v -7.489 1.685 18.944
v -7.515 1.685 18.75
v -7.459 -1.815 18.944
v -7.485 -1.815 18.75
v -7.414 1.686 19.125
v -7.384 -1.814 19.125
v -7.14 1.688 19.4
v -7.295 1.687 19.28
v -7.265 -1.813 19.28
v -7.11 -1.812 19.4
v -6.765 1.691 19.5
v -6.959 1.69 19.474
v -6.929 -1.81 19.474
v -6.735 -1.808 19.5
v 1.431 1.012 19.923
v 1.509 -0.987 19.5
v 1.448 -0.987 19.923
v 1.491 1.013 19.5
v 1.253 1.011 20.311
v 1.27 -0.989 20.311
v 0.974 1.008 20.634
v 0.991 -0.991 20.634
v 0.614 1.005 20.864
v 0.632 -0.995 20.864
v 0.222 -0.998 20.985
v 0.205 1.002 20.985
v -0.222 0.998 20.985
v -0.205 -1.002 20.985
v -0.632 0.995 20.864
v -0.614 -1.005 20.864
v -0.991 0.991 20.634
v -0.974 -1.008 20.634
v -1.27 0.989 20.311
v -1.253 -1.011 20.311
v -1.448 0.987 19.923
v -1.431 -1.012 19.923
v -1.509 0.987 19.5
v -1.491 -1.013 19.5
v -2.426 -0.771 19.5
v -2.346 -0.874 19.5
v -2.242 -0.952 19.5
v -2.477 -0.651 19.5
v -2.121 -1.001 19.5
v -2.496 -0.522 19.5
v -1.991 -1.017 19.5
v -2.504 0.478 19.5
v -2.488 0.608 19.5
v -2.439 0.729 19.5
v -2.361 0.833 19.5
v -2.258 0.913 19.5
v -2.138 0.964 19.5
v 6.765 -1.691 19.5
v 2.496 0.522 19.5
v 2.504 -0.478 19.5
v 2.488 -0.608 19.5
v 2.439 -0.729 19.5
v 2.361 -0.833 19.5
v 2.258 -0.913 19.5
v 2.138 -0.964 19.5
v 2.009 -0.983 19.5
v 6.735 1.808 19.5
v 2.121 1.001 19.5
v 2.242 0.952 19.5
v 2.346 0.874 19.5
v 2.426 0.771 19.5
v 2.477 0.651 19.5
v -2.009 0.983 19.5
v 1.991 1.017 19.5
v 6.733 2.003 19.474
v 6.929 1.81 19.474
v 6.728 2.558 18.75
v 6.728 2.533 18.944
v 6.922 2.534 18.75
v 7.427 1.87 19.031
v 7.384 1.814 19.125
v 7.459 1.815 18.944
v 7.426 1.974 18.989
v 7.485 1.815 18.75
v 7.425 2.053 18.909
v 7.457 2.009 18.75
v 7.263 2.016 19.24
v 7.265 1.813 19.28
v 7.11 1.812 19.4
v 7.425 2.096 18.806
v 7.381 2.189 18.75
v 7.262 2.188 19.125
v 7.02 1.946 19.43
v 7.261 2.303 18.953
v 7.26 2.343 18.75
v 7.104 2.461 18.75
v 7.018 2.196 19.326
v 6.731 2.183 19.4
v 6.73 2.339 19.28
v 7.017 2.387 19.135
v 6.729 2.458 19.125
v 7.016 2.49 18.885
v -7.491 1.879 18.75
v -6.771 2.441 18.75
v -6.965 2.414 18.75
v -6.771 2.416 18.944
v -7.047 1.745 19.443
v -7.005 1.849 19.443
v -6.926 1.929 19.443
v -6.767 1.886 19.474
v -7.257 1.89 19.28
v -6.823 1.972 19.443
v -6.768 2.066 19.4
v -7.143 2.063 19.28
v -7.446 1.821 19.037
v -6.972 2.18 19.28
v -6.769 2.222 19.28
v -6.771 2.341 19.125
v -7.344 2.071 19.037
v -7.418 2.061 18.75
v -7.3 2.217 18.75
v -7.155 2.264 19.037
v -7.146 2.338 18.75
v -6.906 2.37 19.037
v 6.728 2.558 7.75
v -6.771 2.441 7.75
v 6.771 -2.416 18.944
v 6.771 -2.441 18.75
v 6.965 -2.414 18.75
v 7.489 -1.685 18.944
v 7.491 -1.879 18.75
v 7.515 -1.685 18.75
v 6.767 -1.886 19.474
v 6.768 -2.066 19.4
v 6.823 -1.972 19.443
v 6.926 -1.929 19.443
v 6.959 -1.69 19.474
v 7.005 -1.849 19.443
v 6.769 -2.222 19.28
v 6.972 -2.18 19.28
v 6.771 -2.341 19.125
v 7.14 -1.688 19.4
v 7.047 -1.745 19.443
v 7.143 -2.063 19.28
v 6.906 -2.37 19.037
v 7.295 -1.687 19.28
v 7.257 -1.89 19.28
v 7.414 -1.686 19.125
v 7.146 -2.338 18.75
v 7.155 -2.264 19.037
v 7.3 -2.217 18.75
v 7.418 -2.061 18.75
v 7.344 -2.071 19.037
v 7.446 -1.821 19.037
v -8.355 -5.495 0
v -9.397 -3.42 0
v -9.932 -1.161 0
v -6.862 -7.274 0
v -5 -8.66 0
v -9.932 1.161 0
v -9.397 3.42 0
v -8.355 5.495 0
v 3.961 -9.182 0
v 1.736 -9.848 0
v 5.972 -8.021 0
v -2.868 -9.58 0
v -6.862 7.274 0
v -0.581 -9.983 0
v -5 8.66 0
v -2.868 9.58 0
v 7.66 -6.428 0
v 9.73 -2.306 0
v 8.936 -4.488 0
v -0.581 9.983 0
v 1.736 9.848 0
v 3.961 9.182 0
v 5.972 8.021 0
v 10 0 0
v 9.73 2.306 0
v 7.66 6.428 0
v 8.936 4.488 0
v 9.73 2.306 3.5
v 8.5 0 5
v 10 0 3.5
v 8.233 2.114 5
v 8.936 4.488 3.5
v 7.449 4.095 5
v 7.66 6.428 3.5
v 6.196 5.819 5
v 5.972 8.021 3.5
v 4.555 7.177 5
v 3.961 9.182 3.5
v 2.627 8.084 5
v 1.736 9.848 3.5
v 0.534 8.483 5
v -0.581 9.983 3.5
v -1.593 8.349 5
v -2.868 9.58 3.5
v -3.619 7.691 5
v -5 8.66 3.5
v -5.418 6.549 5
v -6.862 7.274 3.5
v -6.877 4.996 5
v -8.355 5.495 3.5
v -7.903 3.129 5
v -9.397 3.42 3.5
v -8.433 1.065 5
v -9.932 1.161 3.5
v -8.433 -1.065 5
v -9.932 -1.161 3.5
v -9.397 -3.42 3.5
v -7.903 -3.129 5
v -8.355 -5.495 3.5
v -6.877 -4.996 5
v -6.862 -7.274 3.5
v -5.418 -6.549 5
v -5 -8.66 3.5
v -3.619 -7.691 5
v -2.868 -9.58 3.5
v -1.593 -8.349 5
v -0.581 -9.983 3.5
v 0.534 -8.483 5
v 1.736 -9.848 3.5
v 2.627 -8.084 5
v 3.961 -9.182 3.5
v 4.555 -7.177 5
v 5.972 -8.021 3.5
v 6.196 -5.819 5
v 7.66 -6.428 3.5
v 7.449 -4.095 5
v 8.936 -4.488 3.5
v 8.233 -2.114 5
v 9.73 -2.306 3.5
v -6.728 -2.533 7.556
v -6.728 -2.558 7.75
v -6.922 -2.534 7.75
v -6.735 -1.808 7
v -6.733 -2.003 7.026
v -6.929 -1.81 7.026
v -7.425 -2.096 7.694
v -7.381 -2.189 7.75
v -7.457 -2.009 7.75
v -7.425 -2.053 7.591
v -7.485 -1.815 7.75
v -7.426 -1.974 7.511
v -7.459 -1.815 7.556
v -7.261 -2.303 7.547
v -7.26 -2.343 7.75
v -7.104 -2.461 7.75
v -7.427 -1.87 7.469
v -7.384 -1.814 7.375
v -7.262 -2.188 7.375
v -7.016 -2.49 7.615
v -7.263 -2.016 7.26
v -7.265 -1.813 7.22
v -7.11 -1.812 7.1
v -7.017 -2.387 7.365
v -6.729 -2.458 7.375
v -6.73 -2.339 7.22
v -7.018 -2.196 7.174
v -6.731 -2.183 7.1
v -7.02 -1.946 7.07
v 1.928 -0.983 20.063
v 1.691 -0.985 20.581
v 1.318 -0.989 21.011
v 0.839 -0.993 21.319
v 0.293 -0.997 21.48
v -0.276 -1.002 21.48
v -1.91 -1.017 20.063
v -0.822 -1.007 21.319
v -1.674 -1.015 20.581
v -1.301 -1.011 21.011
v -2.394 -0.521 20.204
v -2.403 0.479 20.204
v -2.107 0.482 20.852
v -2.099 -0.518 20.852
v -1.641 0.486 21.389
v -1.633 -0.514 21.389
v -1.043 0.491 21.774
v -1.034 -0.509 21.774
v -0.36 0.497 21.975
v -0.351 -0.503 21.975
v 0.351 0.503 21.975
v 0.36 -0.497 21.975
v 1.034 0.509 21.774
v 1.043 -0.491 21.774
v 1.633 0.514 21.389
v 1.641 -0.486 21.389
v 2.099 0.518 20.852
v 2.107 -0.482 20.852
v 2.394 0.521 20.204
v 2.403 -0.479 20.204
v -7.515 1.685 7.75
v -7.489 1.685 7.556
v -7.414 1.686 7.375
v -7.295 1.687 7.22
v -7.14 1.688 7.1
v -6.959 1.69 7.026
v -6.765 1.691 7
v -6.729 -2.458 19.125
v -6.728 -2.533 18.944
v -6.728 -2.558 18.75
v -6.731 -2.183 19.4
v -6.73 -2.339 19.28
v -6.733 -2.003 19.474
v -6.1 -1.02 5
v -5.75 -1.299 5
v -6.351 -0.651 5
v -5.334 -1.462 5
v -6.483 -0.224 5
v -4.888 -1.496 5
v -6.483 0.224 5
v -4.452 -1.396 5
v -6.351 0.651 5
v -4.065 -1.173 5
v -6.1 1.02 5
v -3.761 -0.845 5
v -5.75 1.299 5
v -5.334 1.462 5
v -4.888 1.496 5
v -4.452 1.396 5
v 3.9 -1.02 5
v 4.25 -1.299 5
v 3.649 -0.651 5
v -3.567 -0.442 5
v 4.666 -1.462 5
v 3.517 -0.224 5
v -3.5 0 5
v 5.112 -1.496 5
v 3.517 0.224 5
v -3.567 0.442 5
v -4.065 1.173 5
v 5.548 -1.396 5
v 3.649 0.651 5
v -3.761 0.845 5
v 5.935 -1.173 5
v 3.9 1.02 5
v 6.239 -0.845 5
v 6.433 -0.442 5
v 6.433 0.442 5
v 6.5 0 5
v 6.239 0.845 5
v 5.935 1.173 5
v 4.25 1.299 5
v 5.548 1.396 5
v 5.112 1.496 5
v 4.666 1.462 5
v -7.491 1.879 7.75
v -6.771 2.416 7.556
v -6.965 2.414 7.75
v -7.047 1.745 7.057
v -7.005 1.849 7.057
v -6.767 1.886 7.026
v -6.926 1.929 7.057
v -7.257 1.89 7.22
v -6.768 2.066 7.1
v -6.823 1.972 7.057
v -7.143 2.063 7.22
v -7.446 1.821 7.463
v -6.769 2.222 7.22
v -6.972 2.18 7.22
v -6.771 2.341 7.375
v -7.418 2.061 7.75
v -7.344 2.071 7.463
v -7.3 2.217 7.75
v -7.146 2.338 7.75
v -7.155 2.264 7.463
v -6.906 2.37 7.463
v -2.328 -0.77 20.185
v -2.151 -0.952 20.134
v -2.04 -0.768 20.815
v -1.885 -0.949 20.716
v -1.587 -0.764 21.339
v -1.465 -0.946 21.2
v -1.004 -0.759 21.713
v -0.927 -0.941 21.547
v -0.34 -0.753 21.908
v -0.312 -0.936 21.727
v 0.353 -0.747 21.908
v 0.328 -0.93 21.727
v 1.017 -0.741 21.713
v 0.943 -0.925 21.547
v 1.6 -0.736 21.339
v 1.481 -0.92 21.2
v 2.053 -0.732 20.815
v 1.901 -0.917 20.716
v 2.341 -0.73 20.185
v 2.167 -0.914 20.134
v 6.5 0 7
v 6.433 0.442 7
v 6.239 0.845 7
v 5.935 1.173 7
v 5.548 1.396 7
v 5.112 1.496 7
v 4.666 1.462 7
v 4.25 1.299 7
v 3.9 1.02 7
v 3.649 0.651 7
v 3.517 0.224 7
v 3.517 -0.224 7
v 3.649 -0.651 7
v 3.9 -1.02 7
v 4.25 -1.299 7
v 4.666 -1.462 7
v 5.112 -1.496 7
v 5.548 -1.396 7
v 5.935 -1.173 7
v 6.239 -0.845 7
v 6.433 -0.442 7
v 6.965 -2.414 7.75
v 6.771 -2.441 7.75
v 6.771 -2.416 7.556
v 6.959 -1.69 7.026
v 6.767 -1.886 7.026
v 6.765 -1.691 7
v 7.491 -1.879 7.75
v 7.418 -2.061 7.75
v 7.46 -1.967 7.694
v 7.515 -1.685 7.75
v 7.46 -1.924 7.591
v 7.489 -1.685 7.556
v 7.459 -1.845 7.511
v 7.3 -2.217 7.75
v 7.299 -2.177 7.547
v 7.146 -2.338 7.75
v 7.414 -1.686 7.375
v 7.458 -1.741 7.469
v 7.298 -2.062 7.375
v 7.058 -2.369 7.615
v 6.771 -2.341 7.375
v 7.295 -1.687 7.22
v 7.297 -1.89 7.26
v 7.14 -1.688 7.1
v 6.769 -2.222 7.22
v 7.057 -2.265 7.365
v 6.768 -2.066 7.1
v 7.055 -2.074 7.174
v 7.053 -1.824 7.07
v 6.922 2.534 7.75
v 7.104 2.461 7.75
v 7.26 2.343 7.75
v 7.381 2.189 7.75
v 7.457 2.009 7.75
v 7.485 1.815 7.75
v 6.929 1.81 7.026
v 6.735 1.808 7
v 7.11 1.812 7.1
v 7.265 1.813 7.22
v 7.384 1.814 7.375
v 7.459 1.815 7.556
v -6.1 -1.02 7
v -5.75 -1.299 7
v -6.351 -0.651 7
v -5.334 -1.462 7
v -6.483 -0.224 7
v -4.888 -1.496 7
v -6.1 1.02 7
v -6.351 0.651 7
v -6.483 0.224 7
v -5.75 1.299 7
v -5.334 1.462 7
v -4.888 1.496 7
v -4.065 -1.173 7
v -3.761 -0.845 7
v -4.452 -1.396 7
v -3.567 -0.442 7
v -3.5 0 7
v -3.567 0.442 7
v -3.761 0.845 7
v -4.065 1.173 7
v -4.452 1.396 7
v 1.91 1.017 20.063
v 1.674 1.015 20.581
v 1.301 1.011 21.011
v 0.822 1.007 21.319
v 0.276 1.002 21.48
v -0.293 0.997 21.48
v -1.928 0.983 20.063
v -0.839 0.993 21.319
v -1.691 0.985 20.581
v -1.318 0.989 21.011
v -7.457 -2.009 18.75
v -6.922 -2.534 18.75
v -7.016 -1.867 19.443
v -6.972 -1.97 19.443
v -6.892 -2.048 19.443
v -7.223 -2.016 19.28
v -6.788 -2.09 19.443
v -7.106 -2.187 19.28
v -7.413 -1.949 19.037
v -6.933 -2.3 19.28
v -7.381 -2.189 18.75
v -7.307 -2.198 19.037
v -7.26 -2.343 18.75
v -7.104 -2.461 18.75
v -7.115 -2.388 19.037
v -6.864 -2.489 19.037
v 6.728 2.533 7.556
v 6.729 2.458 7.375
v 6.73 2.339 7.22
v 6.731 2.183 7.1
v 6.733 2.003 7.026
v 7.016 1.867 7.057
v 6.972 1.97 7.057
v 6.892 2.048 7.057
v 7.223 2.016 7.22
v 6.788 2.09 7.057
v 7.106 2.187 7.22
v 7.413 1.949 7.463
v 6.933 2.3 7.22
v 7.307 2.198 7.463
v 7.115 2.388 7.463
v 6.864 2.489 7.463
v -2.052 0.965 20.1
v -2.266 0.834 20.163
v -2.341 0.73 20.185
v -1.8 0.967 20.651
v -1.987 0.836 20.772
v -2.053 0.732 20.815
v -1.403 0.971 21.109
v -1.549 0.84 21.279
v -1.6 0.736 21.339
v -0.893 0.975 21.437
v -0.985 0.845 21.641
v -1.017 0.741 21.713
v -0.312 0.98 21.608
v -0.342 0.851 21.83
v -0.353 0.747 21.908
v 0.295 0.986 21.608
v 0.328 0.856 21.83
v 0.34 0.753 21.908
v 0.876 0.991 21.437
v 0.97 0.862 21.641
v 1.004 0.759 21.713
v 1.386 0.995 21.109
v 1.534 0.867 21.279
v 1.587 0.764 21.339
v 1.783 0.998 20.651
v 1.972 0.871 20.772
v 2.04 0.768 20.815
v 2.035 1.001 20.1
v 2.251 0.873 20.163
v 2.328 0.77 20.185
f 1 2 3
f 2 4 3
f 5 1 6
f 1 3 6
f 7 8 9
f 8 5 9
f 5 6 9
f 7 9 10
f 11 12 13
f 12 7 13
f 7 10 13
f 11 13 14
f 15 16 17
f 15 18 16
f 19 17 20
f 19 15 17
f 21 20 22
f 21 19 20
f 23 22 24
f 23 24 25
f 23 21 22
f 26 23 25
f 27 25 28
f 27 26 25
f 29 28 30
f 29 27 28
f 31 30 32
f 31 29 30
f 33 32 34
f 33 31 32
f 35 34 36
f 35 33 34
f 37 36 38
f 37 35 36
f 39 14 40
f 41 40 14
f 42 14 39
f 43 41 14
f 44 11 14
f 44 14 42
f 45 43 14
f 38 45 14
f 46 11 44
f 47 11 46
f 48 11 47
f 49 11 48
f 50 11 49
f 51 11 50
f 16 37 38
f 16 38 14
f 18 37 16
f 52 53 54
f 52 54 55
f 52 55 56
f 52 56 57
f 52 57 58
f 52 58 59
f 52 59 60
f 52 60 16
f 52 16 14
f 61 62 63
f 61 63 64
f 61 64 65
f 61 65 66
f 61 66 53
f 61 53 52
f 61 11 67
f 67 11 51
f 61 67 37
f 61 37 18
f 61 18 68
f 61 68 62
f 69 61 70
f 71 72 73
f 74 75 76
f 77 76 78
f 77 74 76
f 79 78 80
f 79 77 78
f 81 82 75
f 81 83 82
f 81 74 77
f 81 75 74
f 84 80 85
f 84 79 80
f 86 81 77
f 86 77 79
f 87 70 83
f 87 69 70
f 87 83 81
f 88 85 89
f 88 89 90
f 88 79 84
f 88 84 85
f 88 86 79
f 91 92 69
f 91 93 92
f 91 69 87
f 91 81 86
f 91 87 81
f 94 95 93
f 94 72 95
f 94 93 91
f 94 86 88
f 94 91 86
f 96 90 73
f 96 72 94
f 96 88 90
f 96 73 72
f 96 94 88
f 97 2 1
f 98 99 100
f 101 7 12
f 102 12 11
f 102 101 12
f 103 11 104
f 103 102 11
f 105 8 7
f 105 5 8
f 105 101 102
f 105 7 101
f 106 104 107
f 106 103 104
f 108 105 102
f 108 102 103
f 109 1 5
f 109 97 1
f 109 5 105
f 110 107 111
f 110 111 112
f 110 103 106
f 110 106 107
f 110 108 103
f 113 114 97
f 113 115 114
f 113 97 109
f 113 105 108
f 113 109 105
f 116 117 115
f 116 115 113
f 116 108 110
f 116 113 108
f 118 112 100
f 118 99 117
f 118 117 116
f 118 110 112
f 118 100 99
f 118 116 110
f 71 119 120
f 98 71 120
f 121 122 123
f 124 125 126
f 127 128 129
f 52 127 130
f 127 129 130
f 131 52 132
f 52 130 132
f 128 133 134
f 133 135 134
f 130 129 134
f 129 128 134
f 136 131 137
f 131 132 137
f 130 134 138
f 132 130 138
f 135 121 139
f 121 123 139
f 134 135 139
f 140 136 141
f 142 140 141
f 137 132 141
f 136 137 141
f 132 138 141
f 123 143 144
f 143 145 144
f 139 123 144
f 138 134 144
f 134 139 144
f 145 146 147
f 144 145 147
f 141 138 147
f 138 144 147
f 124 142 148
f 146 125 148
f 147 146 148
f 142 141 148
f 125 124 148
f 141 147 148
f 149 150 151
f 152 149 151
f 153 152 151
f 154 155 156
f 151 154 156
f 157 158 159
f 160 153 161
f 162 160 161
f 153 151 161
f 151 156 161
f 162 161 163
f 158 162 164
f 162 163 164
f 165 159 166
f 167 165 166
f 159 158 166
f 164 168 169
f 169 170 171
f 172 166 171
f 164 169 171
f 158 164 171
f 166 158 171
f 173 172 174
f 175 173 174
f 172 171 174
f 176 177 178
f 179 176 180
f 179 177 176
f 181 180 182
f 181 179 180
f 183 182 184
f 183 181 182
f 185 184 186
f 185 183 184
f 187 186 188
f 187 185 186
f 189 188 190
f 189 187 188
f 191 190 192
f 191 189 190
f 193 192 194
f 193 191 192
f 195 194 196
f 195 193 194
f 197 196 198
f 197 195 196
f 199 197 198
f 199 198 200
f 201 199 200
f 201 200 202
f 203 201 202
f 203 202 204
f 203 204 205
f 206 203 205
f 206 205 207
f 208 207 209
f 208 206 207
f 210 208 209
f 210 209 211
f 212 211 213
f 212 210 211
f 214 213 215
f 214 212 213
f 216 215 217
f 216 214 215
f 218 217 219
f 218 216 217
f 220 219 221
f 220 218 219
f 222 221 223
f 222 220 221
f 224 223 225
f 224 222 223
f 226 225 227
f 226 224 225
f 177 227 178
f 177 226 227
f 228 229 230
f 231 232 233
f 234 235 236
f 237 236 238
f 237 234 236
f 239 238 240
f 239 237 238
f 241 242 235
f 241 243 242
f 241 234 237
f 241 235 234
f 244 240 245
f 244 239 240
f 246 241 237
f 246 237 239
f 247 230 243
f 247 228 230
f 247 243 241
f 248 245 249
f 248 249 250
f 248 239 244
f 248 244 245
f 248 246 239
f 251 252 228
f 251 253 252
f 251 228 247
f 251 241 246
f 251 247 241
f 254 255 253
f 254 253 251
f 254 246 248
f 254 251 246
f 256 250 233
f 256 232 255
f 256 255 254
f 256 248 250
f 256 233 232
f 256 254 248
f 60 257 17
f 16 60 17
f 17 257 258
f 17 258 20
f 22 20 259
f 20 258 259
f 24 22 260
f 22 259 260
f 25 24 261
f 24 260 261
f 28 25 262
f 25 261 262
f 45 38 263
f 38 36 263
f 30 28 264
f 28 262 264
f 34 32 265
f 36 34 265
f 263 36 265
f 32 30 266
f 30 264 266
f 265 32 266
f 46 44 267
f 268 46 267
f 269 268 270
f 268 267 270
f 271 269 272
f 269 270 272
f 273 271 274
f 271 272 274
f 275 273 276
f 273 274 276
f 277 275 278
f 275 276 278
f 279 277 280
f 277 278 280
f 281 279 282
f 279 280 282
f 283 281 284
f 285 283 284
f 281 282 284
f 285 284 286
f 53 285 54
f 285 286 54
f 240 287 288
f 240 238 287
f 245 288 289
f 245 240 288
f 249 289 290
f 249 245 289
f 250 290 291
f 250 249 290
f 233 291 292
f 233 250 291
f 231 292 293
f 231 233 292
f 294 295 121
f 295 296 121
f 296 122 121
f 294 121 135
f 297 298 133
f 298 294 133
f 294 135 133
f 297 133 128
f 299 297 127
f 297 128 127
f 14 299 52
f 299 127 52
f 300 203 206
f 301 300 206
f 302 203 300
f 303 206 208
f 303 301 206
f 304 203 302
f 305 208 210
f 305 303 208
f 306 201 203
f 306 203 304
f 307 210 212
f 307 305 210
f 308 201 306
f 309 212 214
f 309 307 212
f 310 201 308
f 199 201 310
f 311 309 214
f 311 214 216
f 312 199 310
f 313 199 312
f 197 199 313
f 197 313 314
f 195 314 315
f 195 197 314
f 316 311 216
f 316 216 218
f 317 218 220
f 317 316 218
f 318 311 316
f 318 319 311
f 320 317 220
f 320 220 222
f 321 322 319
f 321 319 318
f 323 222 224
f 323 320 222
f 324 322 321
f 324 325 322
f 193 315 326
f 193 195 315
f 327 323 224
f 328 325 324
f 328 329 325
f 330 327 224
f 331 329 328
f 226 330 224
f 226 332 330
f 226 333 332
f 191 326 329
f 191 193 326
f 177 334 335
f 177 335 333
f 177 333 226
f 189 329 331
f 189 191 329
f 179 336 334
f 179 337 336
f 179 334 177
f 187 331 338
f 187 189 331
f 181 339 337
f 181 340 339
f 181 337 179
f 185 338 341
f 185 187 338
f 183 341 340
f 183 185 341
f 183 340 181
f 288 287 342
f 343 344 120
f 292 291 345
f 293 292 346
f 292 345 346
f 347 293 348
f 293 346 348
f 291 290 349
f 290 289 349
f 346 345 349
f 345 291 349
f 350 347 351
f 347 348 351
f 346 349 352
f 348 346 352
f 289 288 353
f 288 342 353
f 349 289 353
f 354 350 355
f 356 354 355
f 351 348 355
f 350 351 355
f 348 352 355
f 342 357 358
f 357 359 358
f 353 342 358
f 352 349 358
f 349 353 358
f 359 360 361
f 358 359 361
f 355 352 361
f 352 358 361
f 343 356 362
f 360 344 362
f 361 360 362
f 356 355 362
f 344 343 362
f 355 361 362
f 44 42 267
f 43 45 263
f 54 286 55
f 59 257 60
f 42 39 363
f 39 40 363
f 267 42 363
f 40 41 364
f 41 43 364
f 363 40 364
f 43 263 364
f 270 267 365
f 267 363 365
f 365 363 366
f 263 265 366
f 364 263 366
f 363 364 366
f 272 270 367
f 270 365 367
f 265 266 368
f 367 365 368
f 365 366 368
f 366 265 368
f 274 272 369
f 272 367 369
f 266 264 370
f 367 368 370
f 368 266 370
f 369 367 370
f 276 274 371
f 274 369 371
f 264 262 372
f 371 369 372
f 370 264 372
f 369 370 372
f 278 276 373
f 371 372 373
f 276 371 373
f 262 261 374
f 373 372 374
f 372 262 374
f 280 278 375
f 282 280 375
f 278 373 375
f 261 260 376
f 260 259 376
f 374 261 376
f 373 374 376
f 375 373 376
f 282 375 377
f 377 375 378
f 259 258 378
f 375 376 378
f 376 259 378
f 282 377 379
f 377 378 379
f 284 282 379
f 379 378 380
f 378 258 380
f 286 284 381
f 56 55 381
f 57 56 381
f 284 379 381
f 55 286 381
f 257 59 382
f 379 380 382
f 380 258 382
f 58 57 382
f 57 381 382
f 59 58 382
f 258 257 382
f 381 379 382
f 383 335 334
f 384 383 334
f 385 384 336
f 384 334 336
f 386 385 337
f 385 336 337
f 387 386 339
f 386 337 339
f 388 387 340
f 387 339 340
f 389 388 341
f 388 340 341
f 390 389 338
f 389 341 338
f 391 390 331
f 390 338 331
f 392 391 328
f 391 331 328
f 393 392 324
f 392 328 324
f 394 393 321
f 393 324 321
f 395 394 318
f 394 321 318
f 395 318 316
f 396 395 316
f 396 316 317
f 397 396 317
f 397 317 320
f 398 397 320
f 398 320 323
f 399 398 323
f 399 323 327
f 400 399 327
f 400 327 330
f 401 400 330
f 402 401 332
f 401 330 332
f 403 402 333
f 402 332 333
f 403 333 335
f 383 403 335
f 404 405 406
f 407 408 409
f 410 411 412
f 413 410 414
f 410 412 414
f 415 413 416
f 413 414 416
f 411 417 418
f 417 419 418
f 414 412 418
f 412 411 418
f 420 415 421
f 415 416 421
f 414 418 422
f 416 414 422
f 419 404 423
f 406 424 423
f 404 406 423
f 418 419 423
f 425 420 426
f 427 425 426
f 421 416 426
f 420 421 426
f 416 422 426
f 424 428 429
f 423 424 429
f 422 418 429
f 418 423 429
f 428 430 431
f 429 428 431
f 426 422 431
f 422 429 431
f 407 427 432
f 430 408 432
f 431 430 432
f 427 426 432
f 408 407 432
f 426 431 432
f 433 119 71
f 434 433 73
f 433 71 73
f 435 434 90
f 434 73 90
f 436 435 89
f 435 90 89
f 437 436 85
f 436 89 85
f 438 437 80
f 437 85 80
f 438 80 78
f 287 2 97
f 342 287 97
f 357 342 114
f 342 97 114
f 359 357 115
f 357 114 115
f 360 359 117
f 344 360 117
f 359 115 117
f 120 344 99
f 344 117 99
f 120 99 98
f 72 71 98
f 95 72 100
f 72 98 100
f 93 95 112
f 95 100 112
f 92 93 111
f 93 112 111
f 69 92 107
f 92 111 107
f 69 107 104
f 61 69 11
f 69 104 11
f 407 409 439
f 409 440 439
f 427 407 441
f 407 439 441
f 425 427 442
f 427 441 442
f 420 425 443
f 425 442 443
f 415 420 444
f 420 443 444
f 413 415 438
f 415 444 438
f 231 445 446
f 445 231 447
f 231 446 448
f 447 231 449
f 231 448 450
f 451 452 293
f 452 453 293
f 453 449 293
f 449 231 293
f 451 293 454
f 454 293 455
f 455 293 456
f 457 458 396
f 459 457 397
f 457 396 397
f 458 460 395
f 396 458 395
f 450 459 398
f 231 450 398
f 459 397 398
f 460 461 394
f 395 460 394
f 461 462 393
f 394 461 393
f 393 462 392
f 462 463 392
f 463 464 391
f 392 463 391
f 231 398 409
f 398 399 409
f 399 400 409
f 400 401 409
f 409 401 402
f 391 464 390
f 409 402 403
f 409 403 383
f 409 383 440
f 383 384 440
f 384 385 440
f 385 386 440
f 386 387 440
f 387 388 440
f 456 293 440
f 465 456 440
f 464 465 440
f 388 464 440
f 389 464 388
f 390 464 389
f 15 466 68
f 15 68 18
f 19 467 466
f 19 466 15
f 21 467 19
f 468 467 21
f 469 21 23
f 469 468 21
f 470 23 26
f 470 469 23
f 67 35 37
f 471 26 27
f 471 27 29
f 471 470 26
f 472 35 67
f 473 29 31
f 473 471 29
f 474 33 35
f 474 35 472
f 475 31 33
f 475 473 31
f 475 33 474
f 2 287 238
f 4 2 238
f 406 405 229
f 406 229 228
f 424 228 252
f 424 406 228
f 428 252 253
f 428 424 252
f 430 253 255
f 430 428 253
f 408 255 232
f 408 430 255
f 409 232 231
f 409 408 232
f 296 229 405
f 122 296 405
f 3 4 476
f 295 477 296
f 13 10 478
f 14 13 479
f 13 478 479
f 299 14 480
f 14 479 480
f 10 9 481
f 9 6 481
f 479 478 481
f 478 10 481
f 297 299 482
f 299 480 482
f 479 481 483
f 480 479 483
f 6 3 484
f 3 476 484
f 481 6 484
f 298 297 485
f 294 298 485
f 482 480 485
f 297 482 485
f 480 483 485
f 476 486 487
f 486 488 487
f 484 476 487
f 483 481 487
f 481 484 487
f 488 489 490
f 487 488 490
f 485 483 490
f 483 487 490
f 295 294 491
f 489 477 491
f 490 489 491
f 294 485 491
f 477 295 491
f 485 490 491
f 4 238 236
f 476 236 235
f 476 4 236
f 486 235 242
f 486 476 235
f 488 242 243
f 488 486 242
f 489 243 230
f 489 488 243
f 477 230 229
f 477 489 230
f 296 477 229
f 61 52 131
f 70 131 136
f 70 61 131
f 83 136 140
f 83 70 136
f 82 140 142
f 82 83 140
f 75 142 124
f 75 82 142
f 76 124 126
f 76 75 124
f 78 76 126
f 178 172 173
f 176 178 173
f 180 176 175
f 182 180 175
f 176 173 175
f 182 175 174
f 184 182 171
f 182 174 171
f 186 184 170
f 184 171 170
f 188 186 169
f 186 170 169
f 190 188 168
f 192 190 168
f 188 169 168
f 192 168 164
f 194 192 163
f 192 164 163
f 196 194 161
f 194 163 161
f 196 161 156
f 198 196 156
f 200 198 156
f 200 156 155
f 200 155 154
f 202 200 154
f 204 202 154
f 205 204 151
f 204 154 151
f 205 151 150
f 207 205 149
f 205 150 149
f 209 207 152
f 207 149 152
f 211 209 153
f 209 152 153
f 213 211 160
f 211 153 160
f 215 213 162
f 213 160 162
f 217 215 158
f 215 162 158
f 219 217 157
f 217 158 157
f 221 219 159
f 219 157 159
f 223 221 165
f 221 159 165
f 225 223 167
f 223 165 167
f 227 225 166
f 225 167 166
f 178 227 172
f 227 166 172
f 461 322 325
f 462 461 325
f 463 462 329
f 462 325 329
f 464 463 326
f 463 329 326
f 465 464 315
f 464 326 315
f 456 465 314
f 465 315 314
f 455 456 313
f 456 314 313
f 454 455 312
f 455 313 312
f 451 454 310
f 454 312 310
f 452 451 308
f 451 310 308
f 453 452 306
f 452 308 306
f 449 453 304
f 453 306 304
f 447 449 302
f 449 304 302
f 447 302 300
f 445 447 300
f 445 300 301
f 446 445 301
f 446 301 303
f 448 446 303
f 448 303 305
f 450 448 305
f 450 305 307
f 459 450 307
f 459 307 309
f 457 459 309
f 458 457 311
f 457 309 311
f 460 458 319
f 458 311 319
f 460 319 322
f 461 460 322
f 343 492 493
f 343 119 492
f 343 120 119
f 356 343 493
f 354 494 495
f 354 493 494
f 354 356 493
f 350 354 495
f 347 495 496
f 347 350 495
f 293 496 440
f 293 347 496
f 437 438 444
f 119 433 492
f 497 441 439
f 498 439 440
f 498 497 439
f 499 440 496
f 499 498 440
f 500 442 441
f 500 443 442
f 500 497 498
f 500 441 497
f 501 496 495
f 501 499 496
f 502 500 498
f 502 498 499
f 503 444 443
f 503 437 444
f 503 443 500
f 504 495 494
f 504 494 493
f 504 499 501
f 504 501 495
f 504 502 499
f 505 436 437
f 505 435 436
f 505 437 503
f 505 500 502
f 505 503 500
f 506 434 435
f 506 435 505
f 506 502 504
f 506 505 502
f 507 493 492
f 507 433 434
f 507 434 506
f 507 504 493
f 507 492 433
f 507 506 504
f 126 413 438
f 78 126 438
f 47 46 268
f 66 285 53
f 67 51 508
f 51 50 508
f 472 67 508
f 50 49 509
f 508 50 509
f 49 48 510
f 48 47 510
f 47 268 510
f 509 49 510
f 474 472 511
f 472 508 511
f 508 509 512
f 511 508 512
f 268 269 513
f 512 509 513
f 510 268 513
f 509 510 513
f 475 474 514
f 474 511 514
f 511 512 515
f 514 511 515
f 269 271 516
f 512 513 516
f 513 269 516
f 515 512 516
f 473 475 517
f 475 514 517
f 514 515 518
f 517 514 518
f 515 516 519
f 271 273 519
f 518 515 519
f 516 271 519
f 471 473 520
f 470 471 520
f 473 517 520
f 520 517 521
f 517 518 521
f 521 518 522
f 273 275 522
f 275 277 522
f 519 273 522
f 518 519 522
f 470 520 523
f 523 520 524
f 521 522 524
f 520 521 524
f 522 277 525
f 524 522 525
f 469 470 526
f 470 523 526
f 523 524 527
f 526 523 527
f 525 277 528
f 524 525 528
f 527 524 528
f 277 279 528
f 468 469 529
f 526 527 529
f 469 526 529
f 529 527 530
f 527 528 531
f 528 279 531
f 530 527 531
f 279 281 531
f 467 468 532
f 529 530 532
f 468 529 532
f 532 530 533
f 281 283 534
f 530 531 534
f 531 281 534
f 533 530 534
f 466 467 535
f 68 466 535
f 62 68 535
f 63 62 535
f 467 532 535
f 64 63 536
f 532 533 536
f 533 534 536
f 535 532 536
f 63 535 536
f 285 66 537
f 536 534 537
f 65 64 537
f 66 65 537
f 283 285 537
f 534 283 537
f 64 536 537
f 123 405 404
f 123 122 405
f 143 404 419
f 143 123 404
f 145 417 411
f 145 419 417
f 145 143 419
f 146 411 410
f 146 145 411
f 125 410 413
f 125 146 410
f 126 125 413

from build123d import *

# Parameters (mm, degrees)
F0_R      = 10
F1_DEPTH  = 5
F2_SIZE   = 1.5
F3_R      = 1.5
F4_DEPTH  = 2
F6_DEPTH  = 12.5
F7_R      = 0.75
F10_DEPTH = 1
F11_DEPTH = 1
F12_R     = 0.5


with BuildPart() as f1:
    # F0 (on Top) → F1 (new body)
    with BuildSketch(Plane.XY):
        Circle(F0_R)
    extrude(amount=F1_DEPTH)

    # F2
    f2_edges = [f1.edges().sort_by_distance(p)[0] for p in [
        (-10, 0, 5),
    ]]
    chamfer(f2_edges, length=F2_SIZE)

    # F3 (on face) → F4 (join)
    with BuildSketch(Plane.XY.offset(5)):
        with Locations((-5, 0)):
            Circle(F3_R)
        with Locations((5, 0)):
            Circle(F3_R)
    extrude(amount=F4_DEPTH)

    # F5 (on face) → F6 (join)
    with BuildSketch(Plane.XY.offset(7)):
        Polygon((-7.5213718601, 2.4349466817), (-7.4997186786, -0.0649595445), (-7.4780654971, -2.5648657707), (7.5213718601, -2.4349466817), (7.4780654971, 2.5648657707), align=None)
        with BuildLine():
            ThreePointArc((-3.5, 0), (-3.5000766094, -0.015159897), (-3.50030643, -0.0303182454))
            ThreePointArc((-3.50030643, -0.0303182454), (-4.9870080911, -1.4999437357), (-6.4989433936, -0.0562912318))
            ThreePointArc((-6.4989433936, -0.0562912318), (-5.0281505737, 1.4997358251), (-3.5, 0))
        make_face(mode=Mode.SUBTRACT)
        with BuildLine():
            Line((-6.4989433936, -0.0562912318), (-3.50030643, -0.0303182454))
            ThreePointArc((-3.50030643, -0.0303182454), (-3.5000766094, -0.015159897), (-3.5, 0))
            ThreePointArc((-3.5, 0), (-5.0281505737, 1.4997358251), (-6.4989433936, -0.0562912318))
        make_face()
        with BuildLine():
            ThreePointArc((-6.4989433936, -0.0562912318), (-4.9870080911, -1.4999437357), (-3.50030643, -0.0303182454))
            Line((-3.50030643, -0.0303182454), (-6.4989433936, -0.0562912318))
        make_face()
    extrude(amount=F6_DEPTH)

    # F7
    f7_edges = [f1.edges().sort_by_distance(p)[0] for p in [
        (0.021653, -2.499906, 7),
        (7.521372, -2.434947, 13.25),
        (-7.478065, -2.564866, 13.25),
        (-7.521372, 2.434947, 13.25),
        (-7.499719, -0.06496, 7),
        (-7.499719, -0.06496, 19.5),
        (-0.021653, 2.499906, 19.5),
        (0.021653, -2.499906, 19.5),
        (7.499719, 0.06496, 19.5),
        (7.478065, 2.564866, 13.25),
        (7.499719, 0.06496, 7),
        (-0.021653, 2.499906, 7),
    ]]
    fillet(f7_edges, radius=F7_R)

    # F9 (on offset) → F10 (join)
    with BuildSketch(Plane(origin=(0, 0, 0), x_dir=(-0.9999624905, -0.0086612726, 0), z_dir=(-0.0086612726, 0.9999624905, 0))):
        with BuildLine():
            ThreePointArc((-1.5, 19.5), (0, 21), (1.5, 19.5))
            Line((1.5, 19.5), (2.5, 19.5))
            ThreePointArc((2.5, 19.5), (0, 22), (-2.5, 19.5))
            Line((-2.5, 19.5), (-1.5, 19.5))
        make_face()
    extrude(amount=F10_DEPTH)

    # F11 (add): a face of the model
    f11_faces = [f1.faces().sort_by_distance(p)[0] for p in [
        (0, 0, 21.0559016994),
    ]]
    extrude(f11_faces, amount=F11_DEPTH)

    # F12
    f12_edges = [f1.edges().sort_by_distance(p)[0] for p in [
        (-0.008661, 0.999962, 22),
        (0.008661, -0.999962, 22),
    ]]
    fillet(f12_edges, radius=F12_R)


solid = f1.part
